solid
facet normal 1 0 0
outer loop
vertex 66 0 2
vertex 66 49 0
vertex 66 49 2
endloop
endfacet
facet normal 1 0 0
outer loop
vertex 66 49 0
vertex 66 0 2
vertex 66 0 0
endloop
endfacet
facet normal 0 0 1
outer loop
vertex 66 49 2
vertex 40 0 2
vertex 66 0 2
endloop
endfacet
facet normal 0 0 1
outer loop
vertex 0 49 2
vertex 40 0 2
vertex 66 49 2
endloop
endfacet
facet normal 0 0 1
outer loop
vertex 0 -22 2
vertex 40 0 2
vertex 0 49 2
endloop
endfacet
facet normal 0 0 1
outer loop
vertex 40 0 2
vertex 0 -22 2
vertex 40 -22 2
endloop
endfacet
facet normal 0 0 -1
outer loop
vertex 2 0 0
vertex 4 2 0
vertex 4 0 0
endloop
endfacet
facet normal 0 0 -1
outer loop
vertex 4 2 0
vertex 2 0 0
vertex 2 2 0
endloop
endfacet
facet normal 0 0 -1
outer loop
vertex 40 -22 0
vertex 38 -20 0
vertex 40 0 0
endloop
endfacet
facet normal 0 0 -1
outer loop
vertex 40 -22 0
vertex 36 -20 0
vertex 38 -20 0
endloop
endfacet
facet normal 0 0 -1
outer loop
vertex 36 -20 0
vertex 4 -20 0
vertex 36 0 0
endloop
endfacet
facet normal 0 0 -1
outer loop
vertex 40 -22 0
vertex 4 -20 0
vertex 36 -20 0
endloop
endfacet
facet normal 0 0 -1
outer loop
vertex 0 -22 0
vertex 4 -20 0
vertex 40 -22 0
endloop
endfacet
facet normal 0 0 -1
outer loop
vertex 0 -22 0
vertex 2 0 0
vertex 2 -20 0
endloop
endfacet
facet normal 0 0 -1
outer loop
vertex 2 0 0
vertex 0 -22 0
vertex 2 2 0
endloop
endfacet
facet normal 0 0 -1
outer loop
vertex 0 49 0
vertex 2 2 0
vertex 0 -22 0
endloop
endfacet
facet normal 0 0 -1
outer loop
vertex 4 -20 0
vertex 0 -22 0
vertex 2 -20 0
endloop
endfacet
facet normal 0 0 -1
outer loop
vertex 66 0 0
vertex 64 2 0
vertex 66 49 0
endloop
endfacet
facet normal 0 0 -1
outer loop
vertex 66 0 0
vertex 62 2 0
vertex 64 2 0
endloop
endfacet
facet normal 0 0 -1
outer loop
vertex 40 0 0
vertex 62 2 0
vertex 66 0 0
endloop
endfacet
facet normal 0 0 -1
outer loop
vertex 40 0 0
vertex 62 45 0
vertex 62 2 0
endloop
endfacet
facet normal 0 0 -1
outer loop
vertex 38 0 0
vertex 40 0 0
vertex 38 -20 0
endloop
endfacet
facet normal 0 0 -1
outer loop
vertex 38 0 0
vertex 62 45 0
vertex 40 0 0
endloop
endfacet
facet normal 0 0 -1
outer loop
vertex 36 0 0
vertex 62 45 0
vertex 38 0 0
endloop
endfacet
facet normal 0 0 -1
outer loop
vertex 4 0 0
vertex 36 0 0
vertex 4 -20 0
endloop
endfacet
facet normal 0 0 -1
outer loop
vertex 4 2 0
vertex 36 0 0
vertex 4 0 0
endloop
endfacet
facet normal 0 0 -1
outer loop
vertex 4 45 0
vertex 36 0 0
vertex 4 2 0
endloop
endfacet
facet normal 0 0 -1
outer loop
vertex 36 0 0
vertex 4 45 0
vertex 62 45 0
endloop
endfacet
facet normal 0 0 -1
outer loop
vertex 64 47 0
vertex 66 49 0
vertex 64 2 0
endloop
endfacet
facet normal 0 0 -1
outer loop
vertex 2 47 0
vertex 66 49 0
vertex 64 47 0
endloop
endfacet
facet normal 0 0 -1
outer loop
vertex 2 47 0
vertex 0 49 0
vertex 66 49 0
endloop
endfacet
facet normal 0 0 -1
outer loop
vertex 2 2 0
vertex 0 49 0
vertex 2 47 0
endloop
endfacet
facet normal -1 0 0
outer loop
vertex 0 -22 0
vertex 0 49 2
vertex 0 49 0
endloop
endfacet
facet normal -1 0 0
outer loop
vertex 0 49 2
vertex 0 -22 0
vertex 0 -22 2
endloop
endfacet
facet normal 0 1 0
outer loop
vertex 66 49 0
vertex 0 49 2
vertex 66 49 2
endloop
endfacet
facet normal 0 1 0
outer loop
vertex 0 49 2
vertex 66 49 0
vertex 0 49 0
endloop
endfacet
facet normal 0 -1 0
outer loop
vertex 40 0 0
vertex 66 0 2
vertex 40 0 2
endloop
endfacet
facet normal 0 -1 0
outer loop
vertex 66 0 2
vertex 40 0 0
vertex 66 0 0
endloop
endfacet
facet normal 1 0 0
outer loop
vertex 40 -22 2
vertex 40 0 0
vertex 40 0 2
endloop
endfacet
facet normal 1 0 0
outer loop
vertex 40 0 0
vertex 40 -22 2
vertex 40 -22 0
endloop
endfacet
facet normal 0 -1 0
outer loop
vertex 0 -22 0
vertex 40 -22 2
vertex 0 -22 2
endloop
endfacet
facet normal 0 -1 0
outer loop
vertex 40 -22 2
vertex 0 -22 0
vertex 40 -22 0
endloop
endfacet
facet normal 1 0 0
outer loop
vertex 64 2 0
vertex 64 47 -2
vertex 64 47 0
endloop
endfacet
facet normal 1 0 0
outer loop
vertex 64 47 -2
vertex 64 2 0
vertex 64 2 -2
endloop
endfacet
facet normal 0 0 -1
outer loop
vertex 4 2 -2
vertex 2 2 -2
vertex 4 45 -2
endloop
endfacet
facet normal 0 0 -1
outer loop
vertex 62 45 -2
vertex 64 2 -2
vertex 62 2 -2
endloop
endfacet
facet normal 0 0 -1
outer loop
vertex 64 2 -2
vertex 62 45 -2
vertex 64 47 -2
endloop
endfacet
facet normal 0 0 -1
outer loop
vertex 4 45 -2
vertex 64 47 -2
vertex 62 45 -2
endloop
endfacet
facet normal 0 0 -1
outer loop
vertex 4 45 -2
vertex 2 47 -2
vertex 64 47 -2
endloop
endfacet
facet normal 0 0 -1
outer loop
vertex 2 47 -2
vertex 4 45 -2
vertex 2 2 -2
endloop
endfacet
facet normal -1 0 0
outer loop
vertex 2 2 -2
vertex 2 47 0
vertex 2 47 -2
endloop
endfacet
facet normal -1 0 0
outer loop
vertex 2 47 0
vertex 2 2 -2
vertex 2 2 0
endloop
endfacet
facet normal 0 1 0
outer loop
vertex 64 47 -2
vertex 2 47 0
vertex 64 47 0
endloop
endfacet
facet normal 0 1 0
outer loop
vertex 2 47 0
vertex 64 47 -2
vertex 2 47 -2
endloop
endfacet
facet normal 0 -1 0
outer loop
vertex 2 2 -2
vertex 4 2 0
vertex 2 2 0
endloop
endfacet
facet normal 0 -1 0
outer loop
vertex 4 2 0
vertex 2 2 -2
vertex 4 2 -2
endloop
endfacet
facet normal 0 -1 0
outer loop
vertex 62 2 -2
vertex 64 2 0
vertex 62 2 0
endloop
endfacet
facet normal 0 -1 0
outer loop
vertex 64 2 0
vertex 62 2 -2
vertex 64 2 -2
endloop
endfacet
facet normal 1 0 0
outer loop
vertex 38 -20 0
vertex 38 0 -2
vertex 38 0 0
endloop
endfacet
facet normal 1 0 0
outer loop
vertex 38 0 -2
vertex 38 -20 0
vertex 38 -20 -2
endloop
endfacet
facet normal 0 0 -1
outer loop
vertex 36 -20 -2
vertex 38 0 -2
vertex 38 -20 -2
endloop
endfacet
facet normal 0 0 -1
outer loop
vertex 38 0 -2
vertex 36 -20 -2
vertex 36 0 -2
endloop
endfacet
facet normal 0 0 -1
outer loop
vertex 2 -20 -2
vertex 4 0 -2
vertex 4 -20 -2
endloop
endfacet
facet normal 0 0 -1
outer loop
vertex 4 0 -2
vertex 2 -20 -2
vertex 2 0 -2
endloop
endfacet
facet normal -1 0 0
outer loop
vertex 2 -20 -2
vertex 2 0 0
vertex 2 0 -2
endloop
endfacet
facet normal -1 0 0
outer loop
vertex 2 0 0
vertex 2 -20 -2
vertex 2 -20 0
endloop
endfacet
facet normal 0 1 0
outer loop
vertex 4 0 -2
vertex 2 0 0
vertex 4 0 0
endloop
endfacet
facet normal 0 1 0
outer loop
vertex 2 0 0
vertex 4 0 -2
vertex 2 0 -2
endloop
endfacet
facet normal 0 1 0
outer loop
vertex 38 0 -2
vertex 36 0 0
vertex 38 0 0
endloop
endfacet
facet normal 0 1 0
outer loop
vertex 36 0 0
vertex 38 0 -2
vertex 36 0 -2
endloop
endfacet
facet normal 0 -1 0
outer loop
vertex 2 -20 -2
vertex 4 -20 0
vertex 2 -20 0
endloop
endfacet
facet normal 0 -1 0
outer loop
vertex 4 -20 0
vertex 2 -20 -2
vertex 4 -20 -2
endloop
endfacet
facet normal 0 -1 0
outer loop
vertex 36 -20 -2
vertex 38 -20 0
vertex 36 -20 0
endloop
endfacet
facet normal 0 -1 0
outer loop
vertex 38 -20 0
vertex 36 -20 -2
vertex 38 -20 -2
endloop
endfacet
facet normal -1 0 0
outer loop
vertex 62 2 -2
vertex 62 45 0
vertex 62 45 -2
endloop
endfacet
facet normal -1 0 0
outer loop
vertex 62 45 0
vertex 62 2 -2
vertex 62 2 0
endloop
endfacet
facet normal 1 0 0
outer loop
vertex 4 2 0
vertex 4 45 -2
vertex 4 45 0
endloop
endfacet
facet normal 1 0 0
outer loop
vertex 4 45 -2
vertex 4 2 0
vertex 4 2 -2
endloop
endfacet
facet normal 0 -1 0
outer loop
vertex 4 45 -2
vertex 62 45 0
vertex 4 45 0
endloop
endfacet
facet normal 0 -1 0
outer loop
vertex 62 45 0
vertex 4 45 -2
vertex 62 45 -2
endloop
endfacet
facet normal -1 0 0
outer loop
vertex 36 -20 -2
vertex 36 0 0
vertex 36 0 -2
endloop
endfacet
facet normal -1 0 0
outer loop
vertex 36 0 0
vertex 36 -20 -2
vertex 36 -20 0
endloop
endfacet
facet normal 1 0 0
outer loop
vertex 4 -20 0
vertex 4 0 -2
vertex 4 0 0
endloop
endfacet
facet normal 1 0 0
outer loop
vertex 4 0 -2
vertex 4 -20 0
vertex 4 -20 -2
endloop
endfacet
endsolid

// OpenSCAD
$fa = 1;
$fs = 0.4;
//Box
//difference(){
//    union(){
//        cube([66,49,26]);
//        translate([0,-22,0])
//            cube([40,22,26]);
//    }
//    translate([2,2,2])
//        cube([62,45,24]);
//    translate([2,-20,2])
//        cube([36,22,24]);
//    rotate([270,0,0])
//        translate([12.5,-11.5,-22])
//            cylinder(h=2,r=2.5);
//    rotate([270,0,0])
//        translate([26,-11.5,-22])
//            cylinder(h=2,r=2.5);    
//
//
//}
//Lid
    union(){
        cube([66,49,2]);
        translate([0,-22,0])
            cube([40,22,2]);
    }
    translate([2,2,-2]){
        difference(){
            union(){
                cube([62,45,2]);
                translate([0,-22,0])
                    cube([36,20,2]);
            }
            translate([2,0,0]){
                cube([58,43,2]);
            }
            translate([2,-22,0])
                cube([32,20,2]);
        }
    }
